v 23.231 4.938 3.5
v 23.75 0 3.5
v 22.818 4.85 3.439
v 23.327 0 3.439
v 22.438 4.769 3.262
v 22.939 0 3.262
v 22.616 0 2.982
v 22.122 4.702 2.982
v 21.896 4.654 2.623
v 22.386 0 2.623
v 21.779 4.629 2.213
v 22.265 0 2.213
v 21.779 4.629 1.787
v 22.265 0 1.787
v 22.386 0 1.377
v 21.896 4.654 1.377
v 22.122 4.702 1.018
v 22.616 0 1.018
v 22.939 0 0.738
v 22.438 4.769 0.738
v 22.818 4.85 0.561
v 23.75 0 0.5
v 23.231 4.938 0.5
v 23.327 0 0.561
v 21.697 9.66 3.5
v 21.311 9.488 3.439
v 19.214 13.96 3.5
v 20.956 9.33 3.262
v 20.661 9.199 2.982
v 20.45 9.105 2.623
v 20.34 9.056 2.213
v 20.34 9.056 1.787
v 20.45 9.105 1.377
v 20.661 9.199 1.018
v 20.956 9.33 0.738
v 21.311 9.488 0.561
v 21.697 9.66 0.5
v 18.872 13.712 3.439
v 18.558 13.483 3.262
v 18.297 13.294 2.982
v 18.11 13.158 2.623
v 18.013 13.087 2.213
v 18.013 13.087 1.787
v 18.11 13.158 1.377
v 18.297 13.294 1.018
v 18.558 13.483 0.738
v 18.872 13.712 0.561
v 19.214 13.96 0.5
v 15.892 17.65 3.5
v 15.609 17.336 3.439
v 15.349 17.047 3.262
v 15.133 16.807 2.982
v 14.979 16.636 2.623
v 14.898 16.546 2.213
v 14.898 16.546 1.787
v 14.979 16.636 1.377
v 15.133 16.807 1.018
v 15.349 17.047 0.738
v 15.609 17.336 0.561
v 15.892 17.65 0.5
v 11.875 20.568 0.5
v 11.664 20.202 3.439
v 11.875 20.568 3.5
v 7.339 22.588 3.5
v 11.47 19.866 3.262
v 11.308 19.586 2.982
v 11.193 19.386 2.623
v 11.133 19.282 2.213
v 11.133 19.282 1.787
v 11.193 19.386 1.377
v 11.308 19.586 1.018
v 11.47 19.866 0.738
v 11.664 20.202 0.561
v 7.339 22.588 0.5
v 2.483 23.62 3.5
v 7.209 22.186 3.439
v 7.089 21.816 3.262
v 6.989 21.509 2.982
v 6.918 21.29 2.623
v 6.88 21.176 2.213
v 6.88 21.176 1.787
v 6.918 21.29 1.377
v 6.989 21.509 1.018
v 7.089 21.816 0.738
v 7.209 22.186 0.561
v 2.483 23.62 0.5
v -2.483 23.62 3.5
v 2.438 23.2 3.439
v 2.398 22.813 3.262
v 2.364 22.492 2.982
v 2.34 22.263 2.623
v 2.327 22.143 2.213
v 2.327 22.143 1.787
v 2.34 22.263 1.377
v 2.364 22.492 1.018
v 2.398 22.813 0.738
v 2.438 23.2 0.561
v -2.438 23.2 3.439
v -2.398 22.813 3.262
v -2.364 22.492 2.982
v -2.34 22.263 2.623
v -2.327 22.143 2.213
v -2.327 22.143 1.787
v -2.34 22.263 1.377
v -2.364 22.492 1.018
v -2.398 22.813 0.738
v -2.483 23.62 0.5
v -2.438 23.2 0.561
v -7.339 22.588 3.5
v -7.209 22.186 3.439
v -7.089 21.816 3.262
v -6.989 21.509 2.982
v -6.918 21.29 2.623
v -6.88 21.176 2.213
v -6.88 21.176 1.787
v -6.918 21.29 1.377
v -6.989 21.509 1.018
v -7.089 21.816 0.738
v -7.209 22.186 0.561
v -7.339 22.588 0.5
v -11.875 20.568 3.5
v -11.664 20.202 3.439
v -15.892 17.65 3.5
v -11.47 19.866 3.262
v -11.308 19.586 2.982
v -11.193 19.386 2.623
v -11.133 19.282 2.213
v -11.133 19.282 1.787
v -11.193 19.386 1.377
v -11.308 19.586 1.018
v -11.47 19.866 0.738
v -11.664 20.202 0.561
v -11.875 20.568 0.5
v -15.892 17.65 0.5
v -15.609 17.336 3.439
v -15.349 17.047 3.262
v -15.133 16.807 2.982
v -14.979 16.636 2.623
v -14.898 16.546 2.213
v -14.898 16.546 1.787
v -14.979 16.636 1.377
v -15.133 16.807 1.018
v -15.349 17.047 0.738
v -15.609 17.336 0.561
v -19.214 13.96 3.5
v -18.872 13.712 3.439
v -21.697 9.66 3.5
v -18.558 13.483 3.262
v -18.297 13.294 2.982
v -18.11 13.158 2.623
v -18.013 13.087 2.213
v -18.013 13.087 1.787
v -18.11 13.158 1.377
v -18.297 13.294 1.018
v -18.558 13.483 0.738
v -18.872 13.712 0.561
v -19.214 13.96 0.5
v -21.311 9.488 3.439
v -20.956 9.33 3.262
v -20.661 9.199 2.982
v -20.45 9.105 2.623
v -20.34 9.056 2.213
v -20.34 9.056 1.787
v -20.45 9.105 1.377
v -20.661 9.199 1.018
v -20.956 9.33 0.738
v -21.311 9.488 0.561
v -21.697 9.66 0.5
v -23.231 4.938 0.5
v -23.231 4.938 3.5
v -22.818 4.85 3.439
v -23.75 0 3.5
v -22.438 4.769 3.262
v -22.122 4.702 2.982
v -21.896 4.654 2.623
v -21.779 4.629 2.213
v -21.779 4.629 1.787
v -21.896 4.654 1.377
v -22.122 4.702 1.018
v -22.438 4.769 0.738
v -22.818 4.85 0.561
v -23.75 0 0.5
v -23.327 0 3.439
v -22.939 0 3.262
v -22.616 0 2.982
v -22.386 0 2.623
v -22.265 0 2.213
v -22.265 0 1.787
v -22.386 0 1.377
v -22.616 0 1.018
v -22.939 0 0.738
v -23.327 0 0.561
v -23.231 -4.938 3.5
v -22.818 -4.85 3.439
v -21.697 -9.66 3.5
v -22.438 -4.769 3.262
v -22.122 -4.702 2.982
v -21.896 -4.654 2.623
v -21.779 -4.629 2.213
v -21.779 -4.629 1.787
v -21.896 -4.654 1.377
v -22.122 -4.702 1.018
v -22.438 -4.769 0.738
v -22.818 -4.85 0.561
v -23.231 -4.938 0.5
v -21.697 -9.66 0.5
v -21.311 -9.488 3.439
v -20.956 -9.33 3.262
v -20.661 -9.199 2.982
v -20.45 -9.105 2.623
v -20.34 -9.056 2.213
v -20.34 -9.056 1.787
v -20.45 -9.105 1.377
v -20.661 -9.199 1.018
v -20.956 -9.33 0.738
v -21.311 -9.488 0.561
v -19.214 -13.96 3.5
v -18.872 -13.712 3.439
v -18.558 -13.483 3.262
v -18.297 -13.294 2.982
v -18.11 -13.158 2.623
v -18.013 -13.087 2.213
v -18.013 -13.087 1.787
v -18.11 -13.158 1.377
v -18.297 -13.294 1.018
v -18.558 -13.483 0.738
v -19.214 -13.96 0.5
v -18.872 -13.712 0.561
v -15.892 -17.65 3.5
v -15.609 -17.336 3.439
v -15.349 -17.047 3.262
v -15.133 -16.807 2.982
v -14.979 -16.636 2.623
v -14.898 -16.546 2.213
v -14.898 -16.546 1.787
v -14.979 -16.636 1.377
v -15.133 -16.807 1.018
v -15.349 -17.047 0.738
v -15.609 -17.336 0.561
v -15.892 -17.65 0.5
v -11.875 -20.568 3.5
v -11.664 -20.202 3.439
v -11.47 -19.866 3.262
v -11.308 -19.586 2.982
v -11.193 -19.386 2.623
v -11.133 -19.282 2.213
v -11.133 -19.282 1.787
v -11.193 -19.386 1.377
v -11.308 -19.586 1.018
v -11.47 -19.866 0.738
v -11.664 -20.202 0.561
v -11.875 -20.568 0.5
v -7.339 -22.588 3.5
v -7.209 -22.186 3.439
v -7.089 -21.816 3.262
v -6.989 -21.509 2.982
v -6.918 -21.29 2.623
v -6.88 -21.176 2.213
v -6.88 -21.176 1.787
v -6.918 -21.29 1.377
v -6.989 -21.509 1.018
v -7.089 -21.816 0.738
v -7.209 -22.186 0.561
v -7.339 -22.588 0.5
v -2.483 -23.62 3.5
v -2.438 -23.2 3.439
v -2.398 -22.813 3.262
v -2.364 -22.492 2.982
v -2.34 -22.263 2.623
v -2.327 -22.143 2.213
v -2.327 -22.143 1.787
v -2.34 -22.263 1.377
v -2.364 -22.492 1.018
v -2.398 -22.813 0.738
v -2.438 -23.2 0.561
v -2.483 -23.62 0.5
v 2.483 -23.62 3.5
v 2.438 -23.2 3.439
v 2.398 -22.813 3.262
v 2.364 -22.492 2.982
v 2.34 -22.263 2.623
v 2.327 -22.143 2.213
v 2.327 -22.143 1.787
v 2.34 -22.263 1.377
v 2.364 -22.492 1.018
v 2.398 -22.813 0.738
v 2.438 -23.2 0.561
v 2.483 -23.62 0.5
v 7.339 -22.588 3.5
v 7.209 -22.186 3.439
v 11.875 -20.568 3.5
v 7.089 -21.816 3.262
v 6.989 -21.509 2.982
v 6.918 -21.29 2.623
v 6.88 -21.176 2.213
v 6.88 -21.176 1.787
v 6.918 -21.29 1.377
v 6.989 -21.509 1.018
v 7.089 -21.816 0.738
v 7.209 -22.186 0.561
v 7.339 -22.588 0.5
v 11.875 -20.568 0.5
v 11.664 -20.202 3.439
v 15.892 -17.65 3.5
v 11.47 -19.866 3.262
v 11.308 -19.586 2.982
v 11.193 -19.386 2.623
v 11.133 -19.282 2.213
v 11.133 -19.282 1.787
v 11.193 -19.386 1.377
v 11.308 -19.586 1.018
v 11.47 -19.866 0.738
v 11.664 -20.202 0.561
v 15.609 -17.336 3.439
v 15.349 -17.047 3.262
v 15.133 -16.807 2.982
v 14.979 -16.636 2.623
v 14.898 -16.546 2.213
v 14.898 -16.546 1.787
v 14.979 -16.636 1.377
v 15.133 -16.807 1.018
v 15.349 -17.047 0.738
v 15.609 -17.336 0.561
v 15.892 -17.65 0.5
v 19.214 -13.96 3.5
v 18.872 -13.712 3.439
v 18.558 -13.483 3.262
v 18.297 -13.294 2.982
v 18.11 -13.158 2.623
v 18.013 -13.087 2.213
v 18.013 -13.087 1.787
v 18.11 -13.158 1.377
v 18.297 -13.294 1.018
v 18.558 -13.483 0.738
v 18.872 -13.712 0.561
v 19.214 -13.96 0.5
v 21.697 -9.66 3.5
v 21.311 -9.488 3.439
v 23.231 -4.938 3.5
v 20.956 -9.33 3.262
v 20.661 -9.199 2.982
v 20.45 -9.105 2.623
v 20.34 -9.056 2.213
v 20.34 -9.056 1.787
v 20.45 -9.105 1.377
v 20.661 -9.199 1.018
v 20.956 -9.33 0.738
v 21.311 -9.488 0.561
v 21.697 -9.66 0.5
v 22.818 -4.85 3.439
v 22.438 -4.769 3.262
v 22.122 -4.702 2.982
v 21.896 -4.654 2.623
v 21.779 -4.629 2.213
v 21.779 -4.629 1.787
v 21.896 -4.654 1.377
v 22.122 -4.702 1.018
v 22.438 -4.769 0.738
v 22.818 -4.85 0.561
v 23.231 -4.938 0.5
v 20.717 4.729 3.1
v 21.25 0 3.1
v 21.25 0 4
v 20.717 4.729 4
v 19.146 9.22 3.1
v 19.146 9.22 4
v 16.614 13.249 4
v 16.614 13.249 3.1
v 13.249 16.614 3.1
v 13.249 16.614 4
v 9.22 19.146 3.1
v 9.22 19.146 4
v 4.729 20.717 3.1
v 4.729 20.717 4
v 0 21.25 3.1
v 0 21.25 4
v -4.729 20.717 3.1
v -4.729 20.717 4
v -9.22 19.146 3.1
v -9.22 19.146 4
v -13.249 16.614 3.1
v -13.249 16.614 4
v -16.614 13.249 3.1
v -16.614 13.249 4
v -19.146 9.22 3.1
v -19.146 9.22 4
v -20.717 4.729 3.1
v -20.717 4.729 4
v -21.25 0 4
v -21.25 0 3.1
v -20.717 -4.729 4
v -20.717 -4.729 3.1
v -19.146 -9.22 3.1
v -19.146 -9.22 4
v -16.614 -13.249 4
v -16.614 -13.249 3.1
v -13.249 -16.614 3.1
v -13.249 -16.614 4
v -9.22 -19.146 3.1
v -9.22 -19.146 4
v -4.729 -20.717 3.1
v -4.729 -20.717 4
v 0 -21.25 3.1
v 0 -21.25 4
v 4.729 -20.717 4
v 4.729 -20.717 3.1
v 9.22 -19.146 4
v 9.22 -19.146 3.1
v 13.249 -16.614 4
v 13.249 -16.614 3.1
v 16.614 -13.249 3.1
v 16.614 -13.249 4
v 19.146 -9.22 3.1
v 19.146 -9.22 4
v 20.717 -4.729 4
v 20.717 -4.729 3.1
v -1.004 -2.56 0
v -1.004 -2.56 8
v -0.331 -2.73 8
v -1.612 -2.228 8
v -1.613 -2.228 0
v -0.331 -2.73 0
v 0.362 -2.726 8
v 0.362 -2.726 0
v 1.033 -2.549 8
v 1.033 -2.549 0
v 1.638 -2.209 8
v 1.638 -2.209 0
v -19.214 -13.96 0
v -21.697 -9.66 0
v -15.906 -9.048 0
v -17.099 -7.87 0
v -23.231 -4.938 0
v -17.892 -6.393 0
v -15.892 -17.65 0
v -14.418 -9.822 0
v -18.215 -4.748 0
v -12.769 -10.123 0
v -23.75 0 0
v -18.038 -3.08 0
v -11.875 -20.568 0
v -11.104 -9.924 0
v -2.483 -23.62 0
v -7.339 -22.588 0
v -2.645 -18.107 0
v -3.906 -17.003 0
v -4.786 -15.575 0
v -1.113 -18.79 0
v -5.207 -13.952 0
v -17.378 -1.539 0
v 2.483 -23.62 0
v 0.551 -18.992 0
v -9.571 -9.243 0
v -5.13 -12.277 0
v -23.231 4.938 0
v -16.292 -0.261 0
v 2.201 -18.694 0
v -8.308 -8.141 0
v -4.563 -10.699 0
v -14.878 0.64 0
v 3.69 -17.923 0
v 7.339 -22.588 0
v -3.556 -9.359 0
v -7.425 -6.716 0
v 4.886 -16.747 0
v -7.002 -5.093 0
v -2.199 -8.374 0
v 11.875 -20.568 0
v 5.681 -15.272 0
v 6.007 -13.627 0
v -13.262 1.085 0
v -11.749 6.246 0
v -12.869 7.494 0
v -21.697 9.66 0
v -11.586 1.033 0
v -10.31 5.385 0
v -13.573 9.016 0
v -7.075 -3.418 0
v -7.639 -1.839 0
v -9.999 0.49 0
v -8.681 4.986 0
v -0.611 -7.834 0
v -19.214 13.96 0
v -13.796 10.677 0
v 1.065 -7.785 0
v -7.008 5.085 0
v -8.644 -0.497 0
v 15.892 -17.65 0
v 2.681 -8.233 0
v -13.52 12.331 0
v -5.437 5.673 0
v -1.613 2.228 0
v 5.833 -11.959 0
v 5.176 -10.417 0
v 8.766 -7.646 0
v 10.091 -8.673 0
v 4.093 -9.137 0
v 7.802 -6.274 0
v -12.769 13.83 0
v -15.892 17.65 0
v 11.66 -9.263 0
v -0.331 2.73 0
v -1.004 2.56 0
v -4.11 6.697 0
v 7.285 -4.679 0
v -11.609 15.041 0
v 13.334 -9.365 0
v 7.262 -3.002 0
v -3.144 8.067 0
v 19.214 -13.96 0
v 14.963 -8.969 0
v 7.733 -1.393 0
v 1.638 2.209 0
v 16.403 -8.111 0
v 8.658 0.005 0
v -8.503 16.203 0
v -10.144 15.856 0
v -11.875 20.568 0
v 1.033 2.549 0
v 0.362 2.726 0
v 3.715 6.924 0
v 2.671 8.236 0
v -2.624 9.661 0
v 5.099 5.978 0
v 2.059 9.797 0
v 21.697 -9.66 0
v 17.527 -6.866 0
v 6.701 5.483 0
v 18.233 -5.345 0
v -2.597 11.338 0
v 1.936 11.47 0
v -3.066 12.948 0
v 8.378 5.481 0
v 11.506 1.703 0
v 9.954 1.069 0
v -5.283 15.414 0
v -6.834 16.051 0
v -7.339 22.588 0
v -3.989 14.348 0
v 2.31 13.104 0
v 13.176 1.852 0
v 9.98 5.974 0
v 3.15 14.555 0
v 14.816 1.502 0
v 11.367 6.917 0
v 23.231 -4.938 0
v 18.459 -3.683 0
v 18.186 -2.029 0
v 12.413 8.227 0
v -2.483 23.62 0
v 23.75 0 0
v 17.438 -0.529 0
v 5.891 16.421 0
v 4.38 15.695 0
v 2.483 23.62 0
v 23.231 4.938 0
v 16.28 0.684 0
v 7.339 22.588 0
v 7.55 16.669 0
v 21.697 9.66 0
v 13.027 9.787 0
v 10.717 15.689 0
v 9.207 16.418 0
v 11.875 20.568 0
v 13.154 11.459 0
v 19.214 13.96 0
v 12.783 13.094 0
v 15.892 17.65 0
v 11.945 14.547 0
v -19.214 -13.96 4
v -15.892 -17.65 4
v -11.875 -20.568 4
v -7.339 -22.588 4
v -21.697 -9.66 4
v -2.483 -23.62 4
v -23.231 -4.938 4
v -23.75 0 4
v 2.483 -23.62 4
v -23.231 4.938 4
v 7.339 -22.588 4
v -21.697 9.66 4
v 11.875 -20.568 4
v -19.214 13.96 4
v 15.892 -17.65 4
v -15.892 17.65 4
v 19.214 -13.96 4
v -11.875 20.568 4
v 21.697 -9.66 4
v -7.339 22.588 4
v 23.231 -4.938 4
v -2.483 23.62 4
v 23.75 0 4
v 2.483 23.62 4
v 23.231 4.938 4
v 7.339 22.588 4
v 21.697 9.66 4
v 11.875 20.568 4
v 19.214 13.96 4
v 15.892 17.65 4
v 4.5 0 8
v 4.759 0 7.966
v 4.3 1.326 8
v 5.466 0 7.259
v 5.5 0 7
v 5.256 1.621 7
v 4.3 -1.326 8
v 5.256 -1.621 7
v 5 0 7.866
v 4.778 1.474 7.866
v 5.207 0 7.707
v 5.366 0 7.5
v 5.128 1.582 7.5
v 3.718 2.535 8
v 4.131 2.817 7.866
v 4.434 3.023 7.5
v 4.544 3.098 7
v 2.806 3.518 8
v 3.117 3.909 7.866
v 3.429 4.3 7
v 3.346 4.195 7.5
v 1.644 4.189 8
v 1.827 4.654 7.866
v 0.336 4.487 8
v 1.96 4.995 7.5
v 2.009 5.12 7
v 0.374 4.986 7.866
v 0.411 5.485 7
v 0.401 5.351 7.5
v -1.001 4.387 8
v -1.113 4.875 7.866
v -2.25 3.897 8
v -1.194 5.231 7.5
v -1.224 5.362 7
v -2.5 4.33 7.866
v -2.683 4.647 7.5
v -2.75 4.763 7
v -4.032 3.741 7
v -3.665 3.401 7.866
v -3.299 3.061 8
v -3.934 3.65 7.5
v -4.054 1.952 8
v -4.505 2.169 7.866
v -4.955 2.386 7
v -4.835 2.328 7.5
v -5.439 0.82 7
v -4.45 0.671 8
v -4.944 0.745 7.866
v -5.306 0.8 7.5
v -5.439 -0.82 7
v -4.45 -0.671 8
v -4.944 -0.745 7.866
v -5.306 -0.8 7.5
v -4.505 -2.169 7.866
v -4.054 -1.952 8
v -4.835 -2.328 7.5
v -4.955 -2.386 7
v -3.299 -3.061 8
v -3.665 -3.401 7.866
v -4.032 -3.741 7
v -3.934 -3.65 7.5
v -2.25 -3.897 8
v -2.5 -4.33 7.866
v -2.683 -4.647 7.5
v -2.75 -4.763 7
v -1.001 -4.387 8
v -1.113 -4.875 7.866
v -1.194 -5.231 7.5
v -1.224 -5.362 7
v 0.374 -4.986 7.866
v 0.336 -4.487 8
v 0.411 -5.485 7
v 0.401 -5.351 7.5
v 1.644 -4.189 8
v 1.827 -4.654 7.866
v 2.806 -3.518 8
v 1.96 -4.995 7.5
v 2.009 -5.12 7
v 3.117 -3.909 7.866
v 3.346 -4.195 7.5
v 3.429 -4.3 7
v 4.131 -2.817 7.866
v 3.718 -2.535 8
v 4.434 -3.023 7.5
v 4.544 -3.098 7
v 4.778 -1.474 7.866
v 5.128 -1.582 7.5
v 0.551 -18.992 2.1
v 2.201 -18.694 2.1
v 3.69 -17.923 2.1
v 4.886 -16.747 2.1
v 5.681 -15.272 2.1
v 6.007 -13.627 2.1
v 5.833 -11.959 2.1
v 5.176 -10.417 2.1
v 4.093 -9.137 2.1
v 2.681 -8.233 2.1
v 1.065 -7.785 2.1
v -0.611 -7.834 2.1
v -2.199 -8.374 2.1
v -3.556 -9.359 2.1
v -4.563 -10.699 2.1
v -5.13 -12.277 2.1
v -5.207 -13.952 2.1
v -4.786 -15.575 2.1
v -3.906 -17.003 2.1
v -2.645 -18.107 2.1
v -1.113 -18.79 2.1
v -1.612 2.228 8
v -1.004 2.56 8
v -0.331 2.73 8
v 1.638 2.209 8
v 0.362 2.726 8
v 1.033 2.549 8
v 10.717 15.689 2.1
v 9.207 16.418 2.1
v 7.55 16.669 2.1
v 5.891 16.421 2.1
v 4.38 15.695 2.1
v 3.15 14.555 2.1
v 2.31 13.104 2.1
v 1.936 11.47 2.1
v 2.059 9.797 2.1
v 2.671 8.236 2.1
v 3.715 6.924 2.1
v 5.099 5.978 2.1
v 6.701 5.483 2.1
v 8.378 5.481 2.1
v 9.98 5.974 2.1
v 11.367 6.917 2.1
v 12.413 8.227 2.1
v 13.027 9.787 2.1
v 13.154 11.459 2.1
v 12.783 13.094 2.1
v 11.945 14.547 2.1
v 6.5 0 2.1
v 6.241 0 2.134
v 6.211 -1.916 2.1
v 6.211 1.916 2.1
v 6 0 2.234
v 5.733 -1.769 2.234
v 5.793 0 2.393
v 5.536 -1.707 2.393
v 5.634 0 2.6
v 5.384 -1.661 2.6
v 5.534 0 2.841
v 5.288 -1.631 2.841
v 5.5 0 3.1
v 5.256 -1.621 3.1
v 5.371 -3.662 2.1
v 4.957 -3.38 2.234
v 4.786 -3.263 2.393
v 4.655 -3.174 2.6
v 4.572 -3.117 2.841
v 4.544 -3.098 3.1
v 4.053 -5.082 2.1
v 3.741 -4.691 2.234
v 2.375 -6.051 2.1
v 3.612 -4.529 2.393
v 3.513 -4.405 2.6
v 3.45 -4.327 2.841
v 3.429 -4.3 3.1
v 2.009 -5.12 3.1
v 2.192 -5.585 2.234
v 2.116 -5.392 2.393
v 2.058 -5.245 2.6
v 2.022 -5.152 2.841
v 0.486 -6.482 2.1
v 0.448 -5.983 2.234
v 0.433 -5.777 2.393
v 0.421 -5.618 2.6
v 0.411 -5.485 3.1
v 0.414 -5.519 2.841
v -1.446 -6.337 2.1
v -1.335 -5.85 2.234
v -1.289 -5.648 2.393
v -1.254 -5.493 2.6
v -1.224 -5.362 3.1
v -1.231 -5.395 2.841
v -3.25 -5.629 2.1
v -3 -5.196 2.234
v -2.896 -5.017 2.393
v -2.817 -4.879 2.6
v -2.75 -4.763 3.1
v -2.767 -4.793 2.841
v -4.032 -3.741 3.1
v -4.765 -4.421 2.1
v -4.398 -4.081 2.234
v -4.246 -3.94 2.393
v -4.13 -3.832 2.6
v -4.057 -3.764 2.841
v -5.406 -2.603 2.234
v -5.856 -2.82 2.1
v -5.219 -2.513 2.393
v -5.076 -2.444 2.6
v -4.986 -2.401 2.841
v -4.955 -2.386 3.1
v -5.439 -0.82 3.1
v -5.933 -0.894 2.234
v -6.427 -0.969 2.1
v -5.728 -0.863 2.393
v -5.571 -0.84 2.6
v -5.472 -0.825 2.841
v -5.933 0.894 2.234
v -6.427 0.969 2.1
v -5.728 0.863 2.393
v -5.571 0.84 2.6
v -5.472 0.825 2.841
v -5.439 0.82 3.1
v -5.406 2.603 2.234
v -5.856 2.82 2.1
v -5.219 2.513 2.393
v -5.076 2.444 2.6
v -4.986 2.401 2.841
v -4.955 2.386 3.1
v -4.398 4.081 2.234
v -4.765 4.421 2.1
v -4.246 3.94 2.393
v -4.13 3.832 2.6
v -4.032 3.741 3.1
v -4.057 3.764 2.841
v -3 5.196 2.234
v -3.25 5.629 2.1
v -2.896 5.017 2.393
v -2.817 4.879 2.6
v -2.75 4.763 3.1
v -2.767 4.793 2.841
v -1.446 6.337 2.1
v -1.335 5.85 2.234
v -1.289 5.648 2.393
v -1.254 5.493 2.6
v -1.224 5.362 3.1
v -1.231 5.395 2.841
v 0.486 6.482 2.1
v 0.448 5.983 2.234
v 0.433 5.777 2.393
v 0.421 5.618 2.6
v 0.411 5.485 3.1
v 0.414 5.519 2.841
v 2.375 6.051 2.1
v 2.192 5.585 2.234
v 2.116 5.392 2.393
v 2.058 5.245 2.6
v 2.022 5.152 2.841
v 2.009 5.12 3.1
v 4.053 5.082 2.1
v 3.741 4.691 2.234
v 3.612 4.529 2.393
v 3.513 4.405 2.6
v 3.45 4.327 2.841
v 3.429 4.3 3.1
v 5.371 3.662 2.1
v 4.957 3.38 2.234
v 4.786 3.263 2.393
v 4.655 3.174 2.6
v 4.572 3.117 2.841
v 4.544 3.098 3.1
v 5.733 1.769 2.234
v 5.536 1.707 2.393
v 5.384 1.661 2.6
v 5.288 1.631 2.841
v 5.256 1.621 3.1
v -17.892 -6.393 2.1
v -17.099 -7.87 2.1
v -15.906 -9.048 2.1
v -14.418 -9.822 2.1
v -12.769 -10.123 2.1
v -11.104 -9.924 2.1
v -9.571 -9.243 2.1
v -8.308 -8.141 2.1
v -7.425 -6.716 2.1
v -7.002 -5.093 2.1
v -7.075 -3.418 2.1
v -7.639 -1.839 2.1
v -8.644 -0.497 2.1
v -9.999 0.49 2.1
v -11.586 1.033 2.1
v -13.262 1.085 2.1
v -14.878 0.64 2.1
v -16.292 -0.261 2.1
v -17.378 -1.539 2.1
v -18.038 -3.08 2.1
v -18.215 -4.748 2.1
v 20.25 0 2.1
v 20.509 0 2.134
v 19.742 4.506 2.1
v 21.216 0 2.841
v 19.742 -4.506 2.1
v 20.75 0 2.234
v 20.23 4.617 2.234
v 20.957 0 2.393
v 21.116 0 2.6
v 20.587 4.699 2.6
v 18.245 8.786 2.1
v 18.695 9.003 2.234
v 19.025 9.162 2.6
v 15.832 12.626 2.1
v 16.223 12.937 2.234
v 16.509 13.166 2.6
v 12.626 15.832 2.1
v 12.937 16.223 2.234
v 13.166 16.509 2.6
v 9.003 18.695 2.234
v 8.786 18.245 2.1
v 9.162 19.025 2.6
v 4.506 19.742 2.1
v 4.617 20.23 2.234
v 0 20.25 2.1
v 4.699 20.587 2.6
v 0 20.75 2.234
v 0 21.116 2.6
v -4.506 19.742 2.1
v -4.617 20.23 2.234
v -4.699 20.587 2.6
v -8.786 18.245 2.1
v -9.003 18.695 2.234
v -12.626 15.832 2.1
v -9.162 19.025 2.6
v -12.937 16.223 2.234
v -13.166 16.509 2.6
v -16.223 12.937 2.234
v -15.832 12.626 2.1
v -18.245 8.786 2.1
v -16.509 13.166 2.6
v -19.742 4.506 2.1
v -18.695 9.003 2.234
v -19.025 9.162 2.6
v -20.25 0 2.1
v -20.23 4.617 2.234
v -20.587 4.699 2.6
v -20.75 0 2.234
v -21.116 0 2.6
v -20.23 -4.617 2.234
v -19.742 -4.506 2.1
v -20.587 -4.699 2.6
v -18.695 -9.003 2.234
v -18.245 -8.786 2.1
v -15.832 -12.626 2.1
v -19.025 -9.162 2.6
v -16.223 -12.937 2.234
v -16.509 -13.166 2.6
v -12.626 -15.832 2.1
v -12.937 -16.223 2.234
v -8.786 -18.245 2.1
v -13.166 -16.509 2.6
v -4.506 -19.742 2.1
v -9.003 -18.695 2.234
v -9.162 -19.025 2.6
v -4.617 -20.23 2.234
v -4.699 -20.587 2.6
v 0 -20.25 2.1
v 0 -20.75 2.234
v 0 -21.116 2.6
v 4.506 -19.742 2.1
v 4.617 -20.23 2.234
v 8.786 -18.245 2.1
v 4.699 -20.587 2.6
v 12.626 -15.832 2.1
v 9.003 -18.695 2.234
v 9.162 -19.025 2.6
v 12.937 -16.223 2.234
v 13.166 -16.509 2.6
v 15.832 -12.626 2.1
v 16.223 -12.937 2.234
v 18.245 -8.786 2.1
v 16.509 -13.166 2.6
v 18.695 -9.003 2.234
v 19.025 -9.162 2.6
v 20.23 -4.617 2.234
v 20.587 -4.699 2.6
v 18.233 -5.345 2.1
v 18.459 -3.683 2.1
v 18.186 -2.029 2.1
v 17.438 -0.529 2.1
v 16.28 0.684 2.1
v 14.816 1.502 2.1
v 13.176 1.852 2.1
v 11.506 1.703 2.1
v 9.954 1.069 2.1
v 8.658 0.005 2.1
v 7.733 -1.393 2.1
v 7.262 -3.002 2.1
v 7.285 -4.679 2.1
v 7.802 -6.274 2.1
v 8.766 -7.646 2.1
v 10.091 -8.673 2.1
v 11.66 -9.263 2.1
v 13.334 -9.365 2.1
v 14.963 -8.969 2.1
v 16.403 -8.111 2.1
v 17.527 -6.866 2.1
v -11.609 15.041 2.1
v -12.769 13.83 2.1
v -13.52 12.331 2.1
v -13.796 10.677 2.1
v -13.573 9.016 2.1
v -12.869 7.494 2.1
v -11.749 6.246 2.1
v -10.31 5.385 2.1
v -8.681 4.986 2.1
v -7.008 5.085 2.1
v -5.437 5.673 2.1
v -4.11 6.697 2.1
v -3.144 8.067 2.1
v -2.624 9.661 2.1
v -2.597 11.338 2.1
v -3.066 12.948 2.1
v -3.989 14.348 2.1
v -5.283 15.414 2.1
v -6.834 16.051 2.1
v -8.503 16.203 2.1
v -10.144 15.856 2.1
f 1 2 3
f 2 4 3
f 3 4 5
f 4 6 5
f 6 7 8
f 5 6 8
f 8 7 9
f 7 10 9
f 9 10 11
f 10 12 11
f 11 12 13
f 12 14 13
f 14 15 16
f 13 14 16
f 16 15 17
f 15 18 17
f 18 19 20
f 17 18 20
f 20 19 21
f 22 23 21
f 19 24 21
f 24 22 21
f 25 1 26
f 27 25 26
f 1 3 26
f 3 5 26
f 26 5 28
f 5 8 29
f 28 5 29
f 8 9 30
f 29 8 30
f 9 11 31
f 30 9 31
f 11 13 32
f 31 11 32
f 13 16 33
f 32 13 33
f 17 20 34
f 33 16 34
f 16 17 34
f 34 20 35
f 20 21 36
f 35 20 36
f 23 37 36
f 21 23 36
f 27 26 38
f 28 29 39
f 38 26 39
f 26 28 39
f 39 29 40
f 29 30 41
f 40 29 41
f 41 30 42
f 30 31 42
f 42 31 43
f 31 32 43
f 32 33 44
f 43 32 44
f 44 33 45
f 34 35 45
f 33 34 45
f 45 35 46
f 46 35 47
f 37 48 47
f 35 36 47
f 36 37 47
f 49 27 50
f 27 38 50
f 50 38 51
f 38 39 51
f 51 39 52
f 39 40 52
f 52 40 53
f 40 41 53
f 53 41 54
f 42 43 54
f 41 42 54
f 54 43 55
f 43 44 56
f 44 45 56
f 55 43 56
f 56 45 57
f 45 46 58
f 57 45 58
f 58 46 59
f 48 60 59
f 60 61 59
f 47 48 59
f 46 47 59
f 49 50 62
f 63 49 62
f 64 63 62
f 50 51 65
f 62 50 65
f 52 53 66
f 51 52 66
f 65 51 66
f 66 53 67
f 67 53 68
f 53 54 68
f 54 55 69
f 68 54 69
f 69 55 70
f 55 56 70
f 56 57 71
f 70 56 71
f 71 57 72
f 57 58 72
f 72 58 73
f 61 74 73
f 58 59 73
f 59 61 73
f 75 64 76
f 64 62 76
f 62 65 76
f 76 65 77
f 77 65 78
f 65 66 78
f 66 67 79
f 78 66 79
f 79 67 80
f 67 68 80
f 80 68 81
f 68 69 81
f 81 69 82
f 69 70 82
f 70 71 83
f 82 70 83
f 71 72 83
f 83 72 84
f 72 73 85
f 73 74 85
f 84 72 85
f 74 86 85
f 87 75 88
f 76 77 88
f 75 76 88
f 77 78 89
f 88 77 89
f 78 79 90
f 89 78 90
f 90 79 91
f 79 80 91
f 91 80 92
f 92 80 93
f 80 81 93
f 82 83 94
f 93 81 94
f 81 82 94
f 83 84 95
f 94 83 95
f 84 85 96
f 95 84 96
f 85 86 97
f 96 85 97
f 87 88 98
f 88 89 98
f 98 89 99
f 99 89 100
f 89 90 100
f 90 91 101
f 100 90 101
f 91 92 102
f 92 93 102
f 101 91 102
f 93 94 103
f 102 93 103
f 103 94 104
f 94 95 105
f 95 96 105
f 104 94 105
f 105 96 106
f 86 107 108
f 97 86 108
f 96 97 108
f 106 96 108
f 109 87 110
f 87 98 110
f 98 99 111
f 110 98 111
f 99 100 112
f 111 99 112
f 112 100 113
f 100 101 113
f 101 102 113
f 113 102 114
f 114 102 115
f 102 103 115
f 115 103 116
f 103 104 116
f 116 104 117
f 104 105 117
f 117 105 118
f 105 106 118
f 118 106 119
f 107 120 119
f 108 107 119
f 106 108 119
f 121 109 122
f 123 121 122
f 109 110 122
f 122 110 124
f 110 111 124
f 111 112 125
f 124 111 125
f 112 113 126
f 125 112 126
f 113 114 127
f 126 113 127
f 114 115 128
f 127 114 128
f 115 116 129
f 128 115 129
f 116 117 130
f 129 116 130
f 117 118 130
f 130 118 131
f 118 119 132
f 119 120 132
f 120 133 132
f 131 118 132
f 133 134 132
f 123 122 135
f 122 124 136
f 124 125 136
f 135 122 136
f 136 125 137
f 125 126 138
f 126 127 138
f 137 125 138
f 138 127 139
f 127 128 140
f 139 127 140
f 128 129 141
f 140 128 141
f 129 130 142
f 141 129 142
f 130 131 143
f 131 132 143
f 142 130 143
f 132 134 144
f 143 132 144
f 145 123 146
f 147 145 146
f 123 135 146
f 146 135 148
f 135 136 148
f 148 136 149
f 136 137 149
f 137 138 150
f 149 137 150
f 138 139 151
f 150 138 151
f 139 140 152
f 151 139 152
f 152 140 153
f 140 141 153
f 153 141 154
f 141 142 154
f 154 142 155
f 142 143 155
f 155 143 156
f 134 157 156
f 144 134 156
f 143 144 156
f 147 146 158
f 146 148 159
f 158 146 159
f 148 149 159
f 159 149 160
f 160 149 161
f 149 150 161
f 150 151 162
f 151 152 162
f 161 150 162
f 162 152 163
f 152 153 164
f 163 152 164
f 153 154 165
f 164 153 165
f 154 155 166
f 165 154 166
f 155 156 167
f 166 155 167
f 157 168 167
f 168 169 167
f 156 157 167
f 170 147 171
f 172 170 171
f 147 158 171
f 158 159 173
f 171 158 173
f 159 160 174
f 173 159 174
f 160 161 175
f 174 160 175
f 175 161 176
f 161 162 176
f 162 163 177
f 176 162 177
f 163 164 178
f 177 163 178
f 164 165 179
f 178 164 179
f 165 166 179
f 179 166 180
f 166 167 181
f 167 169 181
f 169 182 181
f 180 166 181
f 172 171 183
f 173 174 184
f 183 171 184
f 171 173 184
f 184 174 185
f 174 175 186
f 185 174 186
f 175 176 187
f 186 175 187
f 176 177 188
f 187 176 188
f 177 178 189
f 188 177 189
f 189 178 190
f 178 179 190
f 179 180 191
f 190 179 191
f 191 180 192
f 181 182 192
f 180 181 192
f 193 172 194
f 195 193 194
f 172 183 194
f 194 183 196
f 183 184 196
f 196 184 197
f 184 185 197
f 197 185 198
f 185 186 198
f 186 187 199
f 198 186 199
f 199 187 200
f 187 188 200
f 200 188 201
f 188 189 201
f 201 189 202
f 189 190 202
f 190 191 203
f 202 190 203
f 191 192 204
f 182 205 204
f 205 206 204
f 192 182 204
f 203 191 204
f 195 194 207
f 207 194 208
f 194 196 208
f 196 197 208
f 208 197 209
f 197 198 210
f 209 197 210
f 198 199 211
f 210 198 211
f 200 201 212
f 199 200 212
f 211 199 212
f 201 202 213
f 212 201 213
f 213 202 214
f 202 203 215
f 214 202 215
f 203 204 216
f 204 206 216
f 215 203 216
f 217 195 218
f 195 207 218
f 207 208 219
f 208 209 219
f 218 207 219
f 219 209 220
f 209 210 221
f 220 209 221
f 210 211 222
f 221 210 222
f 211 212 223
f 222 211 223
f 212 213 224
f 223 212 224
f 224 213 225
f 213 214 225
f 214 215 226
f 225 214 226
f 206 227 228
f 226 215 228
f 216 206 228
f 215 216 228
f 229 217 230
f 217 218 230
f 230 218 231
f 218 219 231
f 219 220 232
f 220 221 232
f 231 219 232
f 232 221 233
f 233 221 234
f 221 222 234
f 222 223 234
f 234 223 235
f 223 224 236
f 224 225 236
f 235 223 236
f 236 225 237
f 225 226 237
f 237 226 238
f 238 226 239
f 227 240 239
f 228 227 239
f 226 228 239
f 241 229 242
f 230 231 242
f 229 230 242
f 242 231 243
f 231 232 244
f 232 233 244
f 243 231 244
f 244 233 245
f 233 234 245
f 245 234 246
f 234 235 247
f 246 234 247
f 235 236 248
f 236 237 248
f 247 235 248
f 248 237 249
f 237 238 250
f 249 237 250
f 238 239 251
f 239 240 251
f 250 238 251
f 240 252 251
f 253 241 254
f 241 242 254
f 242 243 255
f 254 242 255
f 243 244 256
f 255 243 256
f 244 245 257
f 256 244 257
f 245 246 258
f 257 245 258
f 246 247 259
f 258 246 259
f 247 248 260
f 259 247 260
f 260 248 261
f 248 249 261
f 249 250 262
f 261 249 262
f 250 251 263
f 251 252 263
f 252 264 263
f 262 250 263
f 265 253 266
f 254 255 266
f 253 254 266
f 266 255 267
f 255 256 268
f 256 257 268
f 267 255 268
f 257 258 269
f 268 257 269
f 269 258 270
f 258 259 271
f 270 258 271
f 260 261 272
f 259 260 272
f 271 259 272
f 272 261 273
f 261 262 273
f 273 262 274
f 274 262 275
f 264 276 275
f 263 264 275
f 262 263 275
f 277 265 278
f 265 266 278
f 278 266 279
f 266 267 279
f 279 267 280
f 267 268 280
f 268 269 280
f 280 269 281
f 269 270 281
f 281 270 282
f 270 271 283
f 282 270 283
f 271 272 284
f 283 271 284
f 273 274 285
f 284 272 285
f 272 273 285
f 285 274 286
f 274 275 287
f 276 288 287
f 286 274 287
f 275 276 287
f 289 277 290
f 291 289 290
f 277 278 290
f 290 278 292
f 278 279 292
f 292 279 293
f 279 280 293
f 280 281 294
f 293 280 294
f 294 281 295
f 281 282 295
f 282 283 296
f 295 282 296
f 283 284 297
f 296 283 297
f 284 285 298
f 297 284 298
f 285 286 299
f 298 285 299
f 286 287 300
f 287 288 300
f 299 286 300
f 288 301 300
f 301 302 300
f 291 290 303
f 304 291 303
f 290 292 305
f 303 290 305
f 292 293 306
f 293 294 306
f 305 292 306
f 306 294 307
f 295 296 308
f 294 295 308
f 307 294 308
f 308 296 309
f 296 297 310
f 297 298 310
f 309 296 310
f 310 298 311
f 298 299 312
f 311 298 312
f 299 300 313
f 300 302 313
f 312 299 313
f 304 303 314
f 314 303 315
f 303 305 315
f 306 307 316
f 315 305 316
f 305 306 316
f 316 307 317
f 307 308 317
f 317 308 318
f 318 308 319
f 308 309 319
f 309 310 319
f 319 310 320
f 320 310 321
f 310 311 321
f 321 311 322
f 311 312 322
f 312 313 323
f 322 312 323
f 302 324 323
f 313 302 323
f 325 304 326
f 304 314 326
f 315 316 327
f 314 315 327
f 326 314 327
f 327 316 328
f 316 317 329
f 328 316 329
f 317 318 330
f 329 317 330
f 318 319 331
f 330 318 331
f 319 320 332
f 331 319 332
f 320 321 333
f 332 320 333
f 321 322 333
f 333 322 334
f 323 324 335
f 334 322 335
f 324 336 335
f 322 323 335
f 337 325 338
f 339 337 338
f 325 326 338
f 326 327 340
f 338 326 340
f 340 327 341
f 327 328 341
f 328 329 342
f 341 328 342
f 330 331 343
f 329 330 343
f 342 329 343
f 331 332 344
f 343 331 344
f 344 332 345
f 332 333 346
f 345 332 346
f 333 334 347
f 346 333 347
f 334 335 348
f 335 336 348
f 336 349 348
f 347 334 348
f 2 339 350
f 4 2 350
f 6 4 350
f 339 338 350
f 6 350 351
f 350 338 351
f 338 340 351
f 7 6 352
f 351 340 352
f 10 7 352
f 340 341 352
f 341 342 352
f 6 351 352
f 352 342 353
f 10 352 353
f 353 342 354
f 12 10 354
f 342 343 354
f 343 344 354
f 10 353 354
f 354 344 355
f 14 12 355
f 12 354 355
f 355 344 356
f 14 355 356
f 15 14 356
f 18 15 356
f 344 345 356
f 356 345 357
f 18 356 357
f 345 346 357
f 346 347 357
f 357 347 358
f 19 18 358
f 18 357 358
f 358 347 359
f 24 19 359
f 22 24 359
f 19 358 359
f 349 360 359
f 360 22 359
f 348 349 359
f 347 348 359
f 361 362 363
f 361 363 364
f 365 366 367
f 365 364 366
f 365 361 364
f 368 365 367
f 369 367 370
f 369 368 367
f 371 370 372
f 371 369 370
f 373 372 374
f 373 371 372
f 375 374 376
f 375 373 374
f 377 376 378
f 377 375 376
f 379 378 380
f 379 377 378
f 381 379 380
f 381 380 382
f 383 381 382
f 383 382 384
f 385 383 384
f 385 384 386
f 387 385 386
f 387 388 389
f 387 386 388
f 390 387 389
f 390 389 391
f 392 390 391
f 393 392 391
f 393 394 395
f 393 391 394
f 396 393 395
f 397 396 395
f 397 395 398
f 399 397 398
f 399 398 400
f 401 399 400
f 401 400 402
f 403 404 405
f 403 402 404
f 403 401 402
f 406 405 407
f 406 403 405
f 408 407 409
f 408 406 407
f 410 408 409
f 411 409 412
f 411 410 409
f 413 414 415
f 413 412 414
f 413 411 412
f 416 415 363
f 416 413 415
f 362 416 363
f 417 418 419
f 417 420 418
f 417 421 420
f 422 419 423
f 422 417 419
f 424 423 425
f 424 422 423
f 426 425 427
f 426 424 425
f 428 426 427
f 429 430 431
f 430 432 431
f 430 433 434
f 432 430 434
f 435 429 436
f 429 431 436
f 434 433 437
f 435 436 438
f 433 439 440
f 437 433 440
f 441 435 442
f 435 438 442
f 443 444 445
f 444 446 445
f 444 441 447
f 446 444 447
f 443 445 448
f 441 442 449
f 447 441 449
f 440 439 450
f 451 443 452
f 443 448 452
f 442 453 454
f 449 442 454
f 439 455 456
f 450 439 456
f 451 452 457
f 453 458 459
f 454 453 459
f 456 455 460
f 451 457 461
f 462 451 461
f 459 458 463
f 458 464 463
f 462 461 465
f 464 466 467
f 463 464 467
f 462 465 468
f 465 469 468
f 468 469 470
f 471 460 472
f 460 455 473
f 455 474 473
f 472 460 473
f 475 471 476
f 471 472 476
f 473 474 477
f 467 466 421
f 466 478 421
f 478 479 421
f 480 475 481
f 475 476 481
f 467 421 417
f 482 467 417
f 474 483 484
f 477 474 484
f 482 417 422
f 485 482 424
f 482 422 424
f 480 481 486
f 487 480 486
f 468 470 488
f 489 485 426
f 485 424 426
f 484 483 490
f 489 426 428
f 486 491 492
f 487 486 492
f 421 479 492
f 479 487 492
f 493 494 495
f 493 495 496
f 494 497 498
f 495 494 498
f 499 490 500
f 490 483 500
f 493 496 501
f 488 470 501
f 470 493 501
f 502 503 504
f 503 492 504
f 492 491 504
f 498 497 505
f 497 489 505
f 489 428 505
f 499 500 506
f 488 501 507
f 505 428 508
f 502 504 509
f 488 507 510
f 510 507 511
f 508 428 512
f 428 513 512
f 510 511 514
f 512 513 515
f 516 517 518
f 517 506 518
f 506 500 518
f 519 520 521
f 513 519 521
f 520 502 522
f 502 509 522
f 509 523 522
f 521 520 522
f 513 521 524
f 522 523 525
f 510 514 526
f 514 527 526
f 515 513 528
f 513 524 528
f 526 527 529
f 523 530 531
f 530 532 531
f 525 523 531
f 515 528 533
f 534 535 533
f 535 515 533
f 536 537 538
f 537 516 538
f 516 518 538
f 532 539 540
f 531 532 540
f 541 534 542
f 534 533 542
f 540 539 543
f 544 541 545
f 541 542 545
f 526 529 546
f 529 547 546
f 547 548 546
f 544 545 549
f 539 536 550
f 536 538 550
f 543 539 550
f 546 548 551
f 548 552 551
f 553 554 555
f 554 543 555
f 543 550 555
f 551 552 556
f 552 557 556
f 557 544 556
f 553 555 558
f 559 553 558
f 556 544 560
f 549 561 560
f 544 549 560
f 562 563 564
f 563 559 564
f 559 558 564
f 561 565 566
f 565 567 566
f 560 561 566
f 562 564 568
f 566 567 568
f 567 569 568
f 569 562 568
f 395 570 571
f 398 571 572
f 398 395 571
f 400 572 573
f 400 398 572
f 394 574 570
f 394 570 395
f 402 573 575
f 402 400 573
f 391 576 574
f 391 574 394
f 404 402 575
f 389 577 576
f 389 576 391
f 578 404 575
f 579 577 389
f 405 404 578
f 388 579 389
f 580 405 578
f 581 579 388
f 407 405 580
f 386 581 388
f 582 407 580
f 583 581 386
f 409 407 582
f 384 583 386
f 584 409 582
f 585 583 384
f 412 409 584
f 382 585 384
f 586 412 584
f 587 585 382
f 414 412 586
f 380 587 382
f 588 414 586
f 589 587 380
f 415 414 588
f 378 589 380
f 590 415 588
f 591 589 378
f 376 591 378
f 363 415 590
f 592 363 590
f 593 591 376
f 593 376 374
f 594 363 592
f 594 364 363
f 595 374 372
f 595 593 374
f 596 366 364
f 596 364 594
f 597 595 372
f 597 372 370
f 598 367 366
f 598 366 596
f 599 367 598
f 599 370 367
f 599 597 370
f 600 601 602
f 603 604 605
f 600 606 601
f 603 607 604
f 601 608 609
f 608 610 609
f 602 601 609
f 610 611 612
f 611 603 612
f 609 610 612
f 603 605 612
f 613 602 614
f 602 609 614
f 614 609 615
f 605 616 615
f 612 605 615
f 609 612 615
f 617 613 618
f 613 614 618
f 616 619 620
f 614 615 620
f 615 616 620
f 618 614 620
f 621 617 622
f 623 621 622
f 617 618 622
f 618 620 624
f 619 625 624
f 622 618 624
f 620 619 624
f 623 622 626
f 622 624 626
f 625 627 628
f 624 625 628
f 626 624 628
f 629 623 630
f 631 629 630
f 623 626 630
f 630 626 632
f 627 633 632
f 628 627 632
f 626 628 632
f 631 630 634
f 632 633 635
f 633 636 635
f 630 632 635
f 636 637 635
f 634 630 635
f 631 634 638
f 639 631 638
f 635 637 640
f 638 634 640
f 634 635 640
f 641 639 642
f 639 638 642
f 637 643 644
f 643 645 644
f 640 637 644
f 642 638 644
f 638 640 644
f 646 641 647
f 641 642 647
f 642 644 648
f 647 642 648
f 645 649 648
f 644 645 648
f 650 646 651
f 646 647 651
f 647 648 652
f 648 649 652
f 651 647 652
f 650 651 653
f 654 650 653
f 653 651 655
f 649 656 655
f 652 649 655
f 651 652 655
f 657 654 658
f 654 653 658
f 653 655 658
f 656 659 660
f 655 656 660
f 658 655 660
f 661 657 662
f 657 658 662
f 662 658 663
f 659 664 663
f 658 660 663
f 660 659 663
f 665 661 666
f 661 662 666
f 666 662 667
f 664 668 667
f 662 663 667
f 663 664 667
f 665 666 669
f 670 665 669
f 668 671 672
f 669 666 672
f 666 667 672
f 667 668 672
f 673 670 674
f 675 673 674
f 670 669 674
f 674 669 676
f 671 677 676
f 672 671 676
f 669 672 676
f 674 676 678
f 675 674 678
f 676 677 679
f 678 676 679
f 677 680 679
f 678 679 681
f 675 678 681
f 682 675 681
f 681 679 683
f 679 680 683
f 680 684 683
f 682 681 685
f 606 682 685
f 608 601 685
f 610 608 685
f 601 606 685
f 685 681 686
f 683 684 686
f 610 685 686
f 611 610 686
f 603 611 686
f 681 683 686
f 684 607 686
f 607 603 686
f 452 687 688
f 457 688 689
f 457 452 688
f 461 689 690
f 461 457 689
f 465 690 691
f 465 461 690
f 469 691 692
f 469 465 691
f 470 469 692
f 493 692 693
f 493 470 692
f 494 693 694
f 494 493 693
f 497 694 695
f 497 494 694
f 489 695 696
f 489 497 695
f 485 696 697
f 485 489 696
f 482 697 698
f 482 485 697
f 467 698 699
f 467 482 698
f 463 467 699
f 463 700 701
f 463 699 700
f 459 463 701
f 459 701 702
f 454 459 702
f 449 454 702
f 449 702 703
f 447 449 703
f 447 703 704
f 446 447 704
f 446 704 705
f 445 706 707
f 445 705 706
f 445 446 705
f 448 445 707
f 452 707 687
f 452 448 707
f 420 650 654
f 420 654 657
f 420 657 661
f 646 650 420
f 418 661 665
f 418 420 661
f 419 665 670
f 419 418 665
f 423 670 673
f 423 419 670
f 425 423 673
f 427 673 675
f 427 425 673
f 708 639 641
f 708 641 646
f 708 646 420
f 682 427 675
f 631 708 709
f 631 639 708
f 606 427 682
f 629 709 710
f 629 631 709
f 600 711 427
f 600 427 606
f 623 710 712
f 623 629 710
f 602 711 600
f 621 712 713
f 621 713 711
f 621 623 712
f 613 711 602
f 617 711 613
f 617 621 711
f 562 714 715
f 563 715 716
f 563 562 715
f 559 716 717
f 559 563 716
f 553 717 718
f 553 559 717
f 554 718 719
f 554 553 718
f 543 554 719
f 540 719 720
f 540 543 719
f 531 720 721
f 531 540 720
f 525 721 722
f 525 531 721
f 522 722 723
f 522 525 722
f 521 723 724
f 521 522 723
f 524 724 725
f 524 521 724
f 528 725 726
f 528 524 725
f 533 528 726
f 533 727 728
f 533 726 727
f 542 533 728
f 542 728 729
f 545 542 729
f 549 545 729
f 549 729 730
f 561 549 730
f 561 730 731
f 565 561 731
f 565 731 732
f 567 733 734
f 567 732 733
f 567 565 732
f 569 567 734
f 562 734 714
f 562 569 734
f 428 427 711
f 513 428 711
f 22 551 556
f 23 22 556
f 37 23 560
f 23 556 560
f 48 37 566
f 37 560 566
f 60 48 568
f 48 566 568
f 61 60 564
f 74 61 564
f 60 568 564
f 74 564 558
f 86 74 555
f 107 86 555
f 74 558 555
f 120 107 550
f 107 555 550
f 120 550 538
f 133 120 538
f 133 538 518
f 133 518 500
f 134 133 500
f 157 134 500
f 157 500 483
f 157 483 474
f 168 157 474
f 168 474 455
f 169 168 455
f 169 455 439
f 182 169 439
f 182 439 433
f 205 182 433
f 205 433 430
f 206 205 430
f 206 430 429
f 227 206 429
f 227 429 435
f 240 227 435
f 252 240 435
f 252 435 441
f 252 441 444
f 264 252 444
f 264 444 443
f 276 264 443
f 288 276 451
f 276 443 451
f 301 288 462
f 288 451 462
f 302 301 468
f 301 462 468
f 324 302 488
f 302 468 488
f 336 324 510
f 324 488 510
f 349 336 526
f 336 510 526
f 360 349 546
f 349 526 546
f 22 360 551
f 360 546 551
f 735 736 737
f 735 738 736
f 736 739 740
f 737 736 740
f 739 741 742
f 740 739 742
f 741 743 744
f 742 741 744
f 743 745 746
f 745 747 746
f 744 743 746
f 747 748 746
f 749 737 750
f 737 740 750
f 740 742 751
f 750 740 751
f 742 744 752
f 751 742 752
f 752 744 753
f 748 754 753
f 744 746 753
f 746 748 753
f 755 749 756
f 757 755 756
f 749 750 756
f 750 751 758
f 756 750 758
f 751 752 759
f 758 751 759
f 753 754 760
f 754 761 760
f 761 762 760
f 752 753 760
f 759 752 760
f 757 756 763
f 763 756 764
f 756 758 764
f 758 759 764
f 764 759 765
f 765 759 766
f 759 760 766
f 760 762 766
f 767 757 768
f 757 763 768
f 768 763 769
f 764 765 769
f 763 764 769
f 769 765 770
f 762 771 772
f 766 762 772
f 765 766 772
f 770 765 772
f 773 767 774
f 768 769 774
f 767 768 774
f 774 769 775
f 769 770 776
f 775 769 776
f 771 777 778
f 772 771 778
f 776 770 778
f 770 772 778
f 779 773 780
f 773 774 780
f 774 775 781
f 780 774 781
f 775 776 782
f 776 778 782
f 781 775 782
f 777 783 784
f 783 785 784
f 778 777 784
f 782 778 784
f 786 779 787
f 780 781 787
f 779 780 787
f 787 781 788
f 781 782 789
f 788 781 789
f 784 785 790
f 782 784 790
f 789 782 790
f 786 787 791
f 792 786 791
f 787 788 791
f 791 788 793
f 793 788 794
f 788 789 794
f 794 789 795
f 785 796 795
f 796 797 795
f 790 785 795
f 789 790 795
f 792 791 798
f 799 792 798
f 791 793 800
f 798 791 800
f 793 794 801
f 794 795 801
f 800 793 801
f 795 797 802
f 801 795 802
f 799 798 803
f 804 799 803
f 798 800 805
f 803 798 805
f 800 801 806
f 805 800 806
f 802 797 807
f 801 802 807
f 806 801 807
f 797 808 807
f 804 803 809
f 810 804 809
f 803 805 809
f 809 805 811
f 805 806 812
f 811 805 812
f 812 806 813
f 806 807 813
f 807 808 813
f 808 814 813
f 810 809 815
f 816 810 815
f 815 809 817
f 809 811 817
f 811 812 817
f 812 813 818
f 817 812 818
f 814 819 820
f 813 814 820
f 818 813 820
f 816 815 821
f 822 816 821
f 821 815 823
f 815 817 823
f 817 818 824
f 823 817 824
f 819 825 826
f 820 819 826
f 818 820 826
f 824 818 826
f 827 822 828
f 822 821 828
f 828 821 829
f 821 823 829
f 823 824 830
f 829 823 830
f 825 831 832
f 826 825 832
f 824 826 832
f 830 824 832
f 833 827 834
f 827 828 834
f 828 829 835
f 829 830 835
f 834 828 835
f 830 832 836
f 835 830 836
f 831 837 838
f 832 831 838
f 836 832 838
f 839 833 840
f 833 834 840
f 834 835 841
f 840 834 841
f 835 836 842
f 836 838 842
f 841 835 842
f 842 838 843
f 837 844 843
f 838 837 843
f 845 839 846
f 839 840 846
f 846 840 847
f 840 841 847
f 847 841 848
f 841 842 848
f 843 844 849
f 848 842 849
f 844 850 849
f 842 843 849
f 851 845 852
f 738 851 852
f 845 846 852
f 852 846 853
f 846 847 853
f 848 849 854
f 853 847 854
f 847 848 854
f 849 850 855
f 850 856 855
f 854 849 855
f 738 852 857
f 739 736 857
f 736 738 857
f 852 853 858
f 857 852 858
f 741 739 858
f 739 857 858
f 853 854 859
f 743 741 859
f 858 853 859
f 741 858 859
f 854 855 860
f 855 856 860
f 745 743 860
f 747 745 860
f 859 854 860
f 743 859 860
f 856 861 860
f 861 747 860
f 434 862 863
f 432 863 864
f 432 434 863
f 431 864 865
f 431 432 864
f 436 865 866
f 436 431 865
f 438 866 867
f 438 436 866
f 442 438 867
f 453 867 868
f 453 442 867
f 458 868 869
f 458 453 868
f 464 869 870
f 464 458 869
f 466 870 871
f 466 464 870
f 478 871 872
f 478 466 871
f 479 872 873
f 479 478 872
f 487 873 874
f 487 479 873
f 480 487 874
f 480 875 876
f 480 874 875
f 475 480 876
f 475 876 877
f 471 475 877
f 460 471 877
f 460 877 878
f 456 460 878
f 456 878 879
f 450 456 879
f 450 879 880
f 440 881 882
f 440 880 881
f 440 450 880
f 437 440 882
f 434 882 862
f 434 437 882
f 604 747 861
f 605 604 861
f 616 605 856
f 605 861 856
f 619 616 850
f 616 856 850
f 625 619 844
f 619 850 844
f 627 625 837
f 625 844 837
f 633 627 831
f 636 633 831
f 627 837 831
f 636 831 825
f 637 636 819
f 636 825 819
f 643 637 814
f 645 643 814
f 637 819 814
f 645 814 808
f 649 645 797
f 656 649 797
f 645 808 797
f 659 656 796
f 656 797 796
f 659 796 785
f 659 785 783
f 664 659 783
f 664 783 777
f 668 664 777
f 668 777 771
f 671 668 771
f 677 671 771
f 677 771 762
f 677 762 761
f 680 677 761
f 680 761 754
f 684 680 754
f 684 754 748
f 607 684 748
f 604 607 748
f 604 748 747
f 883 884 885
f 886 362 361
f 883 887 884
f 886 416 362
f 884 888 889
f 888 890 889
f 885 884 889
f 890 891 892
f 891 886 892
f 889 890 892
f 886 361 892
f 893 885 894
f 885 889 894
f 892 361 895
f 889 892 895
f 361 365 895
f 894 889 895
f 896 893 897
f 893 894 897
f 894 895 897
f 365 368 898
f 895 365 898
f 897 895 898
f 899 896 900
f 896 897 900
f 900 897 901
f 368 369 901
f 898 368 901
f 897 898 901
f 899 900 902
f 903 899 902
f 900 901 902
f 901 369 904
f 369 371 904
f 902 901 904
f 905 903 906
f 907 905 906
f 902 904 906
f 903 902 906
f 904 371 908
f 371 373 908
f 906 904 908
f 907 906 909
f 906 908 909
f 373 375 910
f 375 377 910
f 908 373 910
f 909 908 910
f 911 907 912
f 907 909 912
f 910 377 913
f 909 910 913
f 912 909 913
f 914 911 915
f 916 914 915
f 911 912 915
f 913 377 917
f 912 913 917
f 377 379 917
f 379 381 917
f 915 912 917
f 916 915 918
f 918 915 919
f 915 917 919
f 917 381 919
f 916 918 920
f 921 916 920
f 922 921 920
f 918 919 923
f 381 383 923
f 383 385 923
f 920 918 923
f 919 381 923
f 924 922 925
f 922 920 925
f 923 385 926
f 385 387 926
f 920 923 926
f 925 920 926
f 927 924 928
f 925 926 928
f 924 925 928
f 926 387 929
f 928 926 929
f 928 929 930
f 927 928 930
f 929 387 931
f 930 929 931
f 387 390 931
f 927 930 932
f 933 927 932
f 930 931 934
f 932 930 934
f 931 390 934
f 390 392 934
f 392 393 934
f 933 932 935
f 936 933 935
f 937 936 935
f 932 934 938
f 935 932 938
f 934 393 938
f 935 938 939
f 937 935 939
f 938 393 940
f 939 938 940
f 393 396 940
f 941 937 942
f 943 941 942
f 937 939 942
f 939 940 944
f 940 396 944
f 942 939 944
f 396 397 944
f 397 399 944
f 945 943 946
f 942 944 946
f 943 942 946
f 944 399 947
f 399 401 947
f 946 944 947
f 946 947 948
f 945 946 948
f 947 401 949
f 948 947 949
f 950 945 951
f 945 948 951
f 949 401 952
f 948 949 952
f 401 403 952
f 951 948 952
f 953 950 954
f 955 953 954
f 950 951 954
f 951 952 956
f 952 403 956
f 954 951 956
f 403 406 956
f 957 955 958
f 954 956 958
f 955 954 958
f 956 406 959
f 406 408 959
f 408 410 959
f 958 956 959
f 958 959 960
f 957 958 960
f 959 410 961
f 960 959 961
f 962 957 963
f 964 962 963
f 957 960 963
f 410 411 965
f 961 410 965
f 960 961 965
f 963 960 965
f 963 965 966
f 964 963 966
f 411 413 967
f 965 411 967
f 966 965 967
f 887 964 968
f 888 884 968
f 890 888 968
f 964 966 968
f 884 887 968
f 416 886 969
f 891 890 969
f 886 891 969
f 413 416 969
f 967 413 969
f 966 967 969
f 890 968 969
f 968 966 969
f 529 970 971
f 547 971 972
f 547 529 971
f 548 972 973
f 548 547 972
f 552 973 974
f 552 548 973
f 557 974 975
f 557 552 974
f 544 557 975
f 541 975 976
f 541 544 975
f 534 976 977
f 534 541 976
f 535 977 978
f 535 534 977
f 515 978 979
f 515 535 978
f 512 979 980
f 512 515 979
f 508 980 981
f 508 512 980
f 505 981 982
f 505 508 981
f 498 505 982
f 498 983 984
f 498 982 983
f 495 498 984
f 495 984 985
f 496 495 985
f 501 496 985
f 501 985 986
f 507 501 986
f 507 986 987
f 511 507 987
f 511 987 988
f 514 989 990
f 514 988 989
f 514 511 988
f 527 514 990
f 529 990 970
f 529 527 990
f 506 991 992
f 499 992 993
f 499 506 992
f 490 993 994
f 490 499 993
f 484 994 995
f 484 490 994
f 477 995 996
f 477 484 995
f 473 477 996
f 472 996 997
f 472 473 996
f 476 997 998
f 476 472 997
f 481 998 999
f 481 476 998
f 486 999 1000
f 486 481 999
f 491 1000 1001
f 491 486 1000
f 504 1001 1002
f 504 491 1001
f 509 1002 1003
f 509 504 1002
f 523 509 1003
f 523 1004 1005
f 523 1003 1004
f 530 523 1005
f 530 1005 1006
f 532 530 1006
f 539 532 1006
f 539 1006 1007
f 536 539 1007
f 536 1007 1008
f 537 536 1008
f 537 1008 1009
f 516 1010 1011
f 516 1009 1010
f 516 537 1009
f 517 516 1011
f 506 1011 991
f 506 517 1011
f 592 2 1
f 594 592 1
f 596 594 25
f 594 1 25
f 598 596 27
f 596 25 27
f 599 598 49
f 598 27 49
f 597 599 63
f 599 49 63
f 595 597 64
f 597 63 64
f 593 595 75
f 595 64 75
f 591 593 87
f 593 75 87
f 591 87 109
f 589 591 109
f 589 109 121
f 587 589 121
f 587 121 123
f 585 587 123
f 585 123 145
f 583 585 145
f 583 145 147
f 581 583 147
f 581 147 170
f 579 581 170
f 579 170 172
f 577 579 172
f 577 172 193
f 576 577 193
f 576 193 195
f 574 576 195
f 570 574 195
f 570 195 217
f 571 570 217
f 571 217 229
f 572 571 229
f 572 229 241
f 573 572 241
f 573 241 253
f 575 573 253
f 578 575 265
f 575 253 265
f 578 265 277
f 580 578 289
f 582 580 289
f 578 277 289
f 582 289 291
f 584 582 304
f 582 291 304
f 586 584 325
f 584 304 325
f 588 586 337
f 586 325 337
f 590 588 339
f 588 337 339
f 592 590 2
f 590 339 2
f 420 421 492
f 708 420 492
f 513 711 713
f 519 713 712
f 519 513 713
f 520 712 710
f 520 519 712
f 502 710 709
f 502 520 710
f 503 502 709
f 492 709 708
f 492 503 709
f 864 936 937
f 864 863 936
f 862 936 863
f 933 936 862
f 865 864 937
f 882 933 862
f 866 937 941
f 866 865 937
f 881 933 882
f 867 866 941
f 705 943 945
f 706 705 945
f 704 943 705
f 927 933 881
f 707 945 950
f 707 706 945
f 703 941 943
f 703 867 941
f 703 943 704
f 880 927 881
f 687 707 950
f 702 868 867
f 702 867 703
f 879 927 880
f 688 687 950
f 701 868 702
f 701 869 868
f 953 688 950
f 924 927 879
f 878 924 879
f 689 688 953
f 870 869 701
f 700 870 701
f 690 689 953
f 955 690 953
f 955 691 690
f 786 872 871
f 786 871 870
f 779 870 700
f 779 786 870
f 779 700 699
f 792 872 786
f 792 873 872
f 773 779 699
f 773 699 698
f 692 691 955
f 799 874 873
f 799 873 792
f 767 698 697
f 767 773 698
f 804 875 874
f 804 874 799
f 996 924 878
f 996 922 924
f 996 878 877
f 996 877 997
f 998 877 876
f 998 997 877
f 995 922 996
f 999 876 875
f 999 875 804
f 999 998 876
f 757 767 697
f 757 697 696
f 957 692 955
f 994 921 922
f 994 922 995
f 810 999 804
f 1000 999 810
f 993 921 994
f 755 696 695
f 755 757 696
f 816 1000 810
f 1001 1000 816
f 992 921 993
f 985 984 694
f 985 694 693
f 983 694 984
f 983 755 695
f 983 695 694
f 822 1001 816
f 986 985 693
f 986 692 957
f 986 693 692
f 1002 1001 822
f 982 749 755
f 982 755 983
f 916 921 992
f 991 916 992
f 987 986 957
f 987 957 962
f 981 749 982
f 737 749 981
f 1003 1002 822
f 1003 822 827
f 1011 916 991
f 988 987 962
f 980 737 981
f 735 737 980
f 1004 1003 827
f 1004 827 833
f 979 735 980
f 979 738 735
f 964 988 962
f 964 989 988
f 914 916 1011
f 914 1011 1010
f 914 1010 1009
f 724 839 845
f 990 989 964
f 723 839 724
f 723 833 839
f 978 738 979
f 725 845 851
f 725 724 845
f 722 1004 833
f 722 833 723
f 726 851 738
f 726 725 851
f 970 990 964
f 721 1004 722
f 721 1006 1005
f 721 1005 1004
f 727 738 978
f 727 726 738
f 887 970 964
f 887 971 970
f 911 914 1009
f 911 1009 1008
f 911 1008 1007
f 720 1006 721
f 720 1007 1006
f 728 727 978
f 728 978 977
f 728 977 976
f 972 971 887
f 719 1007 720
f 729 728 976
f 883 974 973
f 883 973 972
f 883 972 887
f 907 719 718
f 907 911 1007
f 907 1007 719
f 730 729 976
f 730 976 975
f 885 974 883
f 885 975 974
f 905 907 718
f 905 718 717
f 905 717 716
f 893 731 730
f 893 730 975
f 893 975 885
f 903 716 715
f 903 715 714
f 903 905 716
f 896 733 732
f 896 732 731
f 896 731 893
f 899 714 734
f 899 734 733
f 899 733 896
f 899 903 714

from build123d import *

# Parameters (mm, degrees)
CYLINDER004_R           = 5.625
CYLINDER004_DEPTH       = 20
ARRAY_COUNT             = 5
ARRAY_PLACEMENT_ANGLE   = 127.662
CYLINDER003_R           = 1.5
CYLINDER003_DEPTH       = 20
CYLINDER003_PITCH_ANGLE = 90
CYLINDER002_R           = 2.75
CYLINDER002_DEPTH       = 12
BOX_W                   = 3.25
BOX_H                   = 12
BOX_DEPTH               = 12
CYLINDER005_R           = 21.25
CYLINDER005_DEPTH       = 10
TORUS_R                 = 1.5
CYLINDER_R              = 23.75
CYLINDER_DEPTH          = 4
CYLINDER001_R           = 5.5
CYLINDER001_DEPTH       = 8
FILLET_R                = 1


with BuildPart() as array:
    # Cylinder004 → Cylinder004 (new body)
    with BuildSketch(Plane(origin=(13.375, 0, 0), x_dir=(1, 0, 0), z_dir=(0, 0, 1))):
        Circle(CYLINDER004_R)
    extrude(amount=CYLINDER004_DEPTH)

    # Array: Array ×5 about axis
    array_axis = Axis((0, 0, 0), (0, 0, 1))


with BuildPart() as array_1:
    add(array.part)
    for i in range(1, ARRAY_COUNT):
        add(array.part.rotate(array_axis, i * 360 / ARRAY_COUNT))


with BuildPart() as array_2:
    # Array placement: moved
    add(array_1.part.rotate(Axis((0, 0, 0), (0, 0, 1)), ARRAY_PLACEMENT_ANGLE))


with BuildPart() as setscrew:
    # Cylinder003 → Cylinder003 (new body)
    with BuildSketch(Plane.XY):
        Circle(CYLINDER003_R)
    extrude(amount=CYLINDER003_DEPTH)


with BuildPart() as setscrew_1:
    # Cylinder003 pitch: moved
    add(setscrew.part.rotate(Axis((0, 0, 0), (0, 1, 0)), CYLINDER003_PITCH_ANGLE))


with BuildPart() as setscrew_2:
    # Cylinder003 placement: moved
    add(setscrew_1.part.moved(Location((-10, 0, 15))))


with BuildPart() as cylinder001:
    # Cylinder002 → Cylinder002 (new body)
    with BuildSketch(Plane.XY):
        Circle(CYLINDER002_R)
    extrude(amount=CYLINDER002_DEPTH)


with BuildPart() as shaft:
    # Box → Box (new body)
    with BuildSketch(Plane(origin=(-1.6125, -6, 0), x_dir=(1, 0, 0), z_dir=(0, 0, 1))):
        with Locations((1.625, 6)):
            Rectangle(BOX_W, BOX_H)
    extrude(amount=BOX_DEPTH)

    # Common: intersect Cylinder001
    add(cylinder001.part, mode=Mode.INTERSECT)


with BuildPart() as cylinder002:
    # Cylinder005 → Cylinder005 (new body)
    with BuildSketch(Plane.XY.offset(2.1)):
        Circle(CYLINDER005_R)
    extrude(amount=CYLINDER005_DEPTH)


with BuildPart() as torus:
    # Torus → Torus (revolve)
    with BuildSketch(Plane(origin=(0, 0, 2), x_dir=(1, 0, 0), z_dir=(0, -1, 0))):
        with Locations((23.75, 0)):
            Circle(TORUS_R)
    revolve(axis=Axis((0, 0, 2), (0, 0, 1)))


with BuildPart() as cut002:
    # Cylinder → Cylinder (new body)
    with BuildSketch(Plane.XY):
        Circle(CYLINDER_R)
    extrude(amount=CYLINDER_DEPTH)

    # Cut: cut Torus
    add(torus.part, mode=Mode.SUBTRACT)

    # Cut002: cut Cylinder002
    add(cylinder002.part, mode=Mode.SUBTRACT)


with BuildPart() as fillet_body:
    # Cylinder001 → Cylinder001 (new body)
    with BuildSketch(Plane.XY):
        Circle(CYLINDER001_R)
    extrude(amount=CYLINDER001_DEPTH)

    # Fusion: union Cut002
    add(cut002.part)

    # Cut003: cut shaft
    add(shaft.part, mode=Mode.SUBTRACT)

    # Cut004: cut setscrew
    add(setscrew_2.part, mode=Mode.SUBTRACT)

    # Cut005: cut Array
    add(array_2.part, mode=Mode.SUBTRACT)

    # Fillet
    fillet_edges = [fillet_body.edges().sort_by_distance(p)[0] for p in [
        (-21.25, 0, 2.1),
        (-5.5, 0, 2.1),
        (-5.5, 0, 8),
    ]]
    fillet(fillet_edges, radius=FILLET_R)


solid = fillet_body.part
